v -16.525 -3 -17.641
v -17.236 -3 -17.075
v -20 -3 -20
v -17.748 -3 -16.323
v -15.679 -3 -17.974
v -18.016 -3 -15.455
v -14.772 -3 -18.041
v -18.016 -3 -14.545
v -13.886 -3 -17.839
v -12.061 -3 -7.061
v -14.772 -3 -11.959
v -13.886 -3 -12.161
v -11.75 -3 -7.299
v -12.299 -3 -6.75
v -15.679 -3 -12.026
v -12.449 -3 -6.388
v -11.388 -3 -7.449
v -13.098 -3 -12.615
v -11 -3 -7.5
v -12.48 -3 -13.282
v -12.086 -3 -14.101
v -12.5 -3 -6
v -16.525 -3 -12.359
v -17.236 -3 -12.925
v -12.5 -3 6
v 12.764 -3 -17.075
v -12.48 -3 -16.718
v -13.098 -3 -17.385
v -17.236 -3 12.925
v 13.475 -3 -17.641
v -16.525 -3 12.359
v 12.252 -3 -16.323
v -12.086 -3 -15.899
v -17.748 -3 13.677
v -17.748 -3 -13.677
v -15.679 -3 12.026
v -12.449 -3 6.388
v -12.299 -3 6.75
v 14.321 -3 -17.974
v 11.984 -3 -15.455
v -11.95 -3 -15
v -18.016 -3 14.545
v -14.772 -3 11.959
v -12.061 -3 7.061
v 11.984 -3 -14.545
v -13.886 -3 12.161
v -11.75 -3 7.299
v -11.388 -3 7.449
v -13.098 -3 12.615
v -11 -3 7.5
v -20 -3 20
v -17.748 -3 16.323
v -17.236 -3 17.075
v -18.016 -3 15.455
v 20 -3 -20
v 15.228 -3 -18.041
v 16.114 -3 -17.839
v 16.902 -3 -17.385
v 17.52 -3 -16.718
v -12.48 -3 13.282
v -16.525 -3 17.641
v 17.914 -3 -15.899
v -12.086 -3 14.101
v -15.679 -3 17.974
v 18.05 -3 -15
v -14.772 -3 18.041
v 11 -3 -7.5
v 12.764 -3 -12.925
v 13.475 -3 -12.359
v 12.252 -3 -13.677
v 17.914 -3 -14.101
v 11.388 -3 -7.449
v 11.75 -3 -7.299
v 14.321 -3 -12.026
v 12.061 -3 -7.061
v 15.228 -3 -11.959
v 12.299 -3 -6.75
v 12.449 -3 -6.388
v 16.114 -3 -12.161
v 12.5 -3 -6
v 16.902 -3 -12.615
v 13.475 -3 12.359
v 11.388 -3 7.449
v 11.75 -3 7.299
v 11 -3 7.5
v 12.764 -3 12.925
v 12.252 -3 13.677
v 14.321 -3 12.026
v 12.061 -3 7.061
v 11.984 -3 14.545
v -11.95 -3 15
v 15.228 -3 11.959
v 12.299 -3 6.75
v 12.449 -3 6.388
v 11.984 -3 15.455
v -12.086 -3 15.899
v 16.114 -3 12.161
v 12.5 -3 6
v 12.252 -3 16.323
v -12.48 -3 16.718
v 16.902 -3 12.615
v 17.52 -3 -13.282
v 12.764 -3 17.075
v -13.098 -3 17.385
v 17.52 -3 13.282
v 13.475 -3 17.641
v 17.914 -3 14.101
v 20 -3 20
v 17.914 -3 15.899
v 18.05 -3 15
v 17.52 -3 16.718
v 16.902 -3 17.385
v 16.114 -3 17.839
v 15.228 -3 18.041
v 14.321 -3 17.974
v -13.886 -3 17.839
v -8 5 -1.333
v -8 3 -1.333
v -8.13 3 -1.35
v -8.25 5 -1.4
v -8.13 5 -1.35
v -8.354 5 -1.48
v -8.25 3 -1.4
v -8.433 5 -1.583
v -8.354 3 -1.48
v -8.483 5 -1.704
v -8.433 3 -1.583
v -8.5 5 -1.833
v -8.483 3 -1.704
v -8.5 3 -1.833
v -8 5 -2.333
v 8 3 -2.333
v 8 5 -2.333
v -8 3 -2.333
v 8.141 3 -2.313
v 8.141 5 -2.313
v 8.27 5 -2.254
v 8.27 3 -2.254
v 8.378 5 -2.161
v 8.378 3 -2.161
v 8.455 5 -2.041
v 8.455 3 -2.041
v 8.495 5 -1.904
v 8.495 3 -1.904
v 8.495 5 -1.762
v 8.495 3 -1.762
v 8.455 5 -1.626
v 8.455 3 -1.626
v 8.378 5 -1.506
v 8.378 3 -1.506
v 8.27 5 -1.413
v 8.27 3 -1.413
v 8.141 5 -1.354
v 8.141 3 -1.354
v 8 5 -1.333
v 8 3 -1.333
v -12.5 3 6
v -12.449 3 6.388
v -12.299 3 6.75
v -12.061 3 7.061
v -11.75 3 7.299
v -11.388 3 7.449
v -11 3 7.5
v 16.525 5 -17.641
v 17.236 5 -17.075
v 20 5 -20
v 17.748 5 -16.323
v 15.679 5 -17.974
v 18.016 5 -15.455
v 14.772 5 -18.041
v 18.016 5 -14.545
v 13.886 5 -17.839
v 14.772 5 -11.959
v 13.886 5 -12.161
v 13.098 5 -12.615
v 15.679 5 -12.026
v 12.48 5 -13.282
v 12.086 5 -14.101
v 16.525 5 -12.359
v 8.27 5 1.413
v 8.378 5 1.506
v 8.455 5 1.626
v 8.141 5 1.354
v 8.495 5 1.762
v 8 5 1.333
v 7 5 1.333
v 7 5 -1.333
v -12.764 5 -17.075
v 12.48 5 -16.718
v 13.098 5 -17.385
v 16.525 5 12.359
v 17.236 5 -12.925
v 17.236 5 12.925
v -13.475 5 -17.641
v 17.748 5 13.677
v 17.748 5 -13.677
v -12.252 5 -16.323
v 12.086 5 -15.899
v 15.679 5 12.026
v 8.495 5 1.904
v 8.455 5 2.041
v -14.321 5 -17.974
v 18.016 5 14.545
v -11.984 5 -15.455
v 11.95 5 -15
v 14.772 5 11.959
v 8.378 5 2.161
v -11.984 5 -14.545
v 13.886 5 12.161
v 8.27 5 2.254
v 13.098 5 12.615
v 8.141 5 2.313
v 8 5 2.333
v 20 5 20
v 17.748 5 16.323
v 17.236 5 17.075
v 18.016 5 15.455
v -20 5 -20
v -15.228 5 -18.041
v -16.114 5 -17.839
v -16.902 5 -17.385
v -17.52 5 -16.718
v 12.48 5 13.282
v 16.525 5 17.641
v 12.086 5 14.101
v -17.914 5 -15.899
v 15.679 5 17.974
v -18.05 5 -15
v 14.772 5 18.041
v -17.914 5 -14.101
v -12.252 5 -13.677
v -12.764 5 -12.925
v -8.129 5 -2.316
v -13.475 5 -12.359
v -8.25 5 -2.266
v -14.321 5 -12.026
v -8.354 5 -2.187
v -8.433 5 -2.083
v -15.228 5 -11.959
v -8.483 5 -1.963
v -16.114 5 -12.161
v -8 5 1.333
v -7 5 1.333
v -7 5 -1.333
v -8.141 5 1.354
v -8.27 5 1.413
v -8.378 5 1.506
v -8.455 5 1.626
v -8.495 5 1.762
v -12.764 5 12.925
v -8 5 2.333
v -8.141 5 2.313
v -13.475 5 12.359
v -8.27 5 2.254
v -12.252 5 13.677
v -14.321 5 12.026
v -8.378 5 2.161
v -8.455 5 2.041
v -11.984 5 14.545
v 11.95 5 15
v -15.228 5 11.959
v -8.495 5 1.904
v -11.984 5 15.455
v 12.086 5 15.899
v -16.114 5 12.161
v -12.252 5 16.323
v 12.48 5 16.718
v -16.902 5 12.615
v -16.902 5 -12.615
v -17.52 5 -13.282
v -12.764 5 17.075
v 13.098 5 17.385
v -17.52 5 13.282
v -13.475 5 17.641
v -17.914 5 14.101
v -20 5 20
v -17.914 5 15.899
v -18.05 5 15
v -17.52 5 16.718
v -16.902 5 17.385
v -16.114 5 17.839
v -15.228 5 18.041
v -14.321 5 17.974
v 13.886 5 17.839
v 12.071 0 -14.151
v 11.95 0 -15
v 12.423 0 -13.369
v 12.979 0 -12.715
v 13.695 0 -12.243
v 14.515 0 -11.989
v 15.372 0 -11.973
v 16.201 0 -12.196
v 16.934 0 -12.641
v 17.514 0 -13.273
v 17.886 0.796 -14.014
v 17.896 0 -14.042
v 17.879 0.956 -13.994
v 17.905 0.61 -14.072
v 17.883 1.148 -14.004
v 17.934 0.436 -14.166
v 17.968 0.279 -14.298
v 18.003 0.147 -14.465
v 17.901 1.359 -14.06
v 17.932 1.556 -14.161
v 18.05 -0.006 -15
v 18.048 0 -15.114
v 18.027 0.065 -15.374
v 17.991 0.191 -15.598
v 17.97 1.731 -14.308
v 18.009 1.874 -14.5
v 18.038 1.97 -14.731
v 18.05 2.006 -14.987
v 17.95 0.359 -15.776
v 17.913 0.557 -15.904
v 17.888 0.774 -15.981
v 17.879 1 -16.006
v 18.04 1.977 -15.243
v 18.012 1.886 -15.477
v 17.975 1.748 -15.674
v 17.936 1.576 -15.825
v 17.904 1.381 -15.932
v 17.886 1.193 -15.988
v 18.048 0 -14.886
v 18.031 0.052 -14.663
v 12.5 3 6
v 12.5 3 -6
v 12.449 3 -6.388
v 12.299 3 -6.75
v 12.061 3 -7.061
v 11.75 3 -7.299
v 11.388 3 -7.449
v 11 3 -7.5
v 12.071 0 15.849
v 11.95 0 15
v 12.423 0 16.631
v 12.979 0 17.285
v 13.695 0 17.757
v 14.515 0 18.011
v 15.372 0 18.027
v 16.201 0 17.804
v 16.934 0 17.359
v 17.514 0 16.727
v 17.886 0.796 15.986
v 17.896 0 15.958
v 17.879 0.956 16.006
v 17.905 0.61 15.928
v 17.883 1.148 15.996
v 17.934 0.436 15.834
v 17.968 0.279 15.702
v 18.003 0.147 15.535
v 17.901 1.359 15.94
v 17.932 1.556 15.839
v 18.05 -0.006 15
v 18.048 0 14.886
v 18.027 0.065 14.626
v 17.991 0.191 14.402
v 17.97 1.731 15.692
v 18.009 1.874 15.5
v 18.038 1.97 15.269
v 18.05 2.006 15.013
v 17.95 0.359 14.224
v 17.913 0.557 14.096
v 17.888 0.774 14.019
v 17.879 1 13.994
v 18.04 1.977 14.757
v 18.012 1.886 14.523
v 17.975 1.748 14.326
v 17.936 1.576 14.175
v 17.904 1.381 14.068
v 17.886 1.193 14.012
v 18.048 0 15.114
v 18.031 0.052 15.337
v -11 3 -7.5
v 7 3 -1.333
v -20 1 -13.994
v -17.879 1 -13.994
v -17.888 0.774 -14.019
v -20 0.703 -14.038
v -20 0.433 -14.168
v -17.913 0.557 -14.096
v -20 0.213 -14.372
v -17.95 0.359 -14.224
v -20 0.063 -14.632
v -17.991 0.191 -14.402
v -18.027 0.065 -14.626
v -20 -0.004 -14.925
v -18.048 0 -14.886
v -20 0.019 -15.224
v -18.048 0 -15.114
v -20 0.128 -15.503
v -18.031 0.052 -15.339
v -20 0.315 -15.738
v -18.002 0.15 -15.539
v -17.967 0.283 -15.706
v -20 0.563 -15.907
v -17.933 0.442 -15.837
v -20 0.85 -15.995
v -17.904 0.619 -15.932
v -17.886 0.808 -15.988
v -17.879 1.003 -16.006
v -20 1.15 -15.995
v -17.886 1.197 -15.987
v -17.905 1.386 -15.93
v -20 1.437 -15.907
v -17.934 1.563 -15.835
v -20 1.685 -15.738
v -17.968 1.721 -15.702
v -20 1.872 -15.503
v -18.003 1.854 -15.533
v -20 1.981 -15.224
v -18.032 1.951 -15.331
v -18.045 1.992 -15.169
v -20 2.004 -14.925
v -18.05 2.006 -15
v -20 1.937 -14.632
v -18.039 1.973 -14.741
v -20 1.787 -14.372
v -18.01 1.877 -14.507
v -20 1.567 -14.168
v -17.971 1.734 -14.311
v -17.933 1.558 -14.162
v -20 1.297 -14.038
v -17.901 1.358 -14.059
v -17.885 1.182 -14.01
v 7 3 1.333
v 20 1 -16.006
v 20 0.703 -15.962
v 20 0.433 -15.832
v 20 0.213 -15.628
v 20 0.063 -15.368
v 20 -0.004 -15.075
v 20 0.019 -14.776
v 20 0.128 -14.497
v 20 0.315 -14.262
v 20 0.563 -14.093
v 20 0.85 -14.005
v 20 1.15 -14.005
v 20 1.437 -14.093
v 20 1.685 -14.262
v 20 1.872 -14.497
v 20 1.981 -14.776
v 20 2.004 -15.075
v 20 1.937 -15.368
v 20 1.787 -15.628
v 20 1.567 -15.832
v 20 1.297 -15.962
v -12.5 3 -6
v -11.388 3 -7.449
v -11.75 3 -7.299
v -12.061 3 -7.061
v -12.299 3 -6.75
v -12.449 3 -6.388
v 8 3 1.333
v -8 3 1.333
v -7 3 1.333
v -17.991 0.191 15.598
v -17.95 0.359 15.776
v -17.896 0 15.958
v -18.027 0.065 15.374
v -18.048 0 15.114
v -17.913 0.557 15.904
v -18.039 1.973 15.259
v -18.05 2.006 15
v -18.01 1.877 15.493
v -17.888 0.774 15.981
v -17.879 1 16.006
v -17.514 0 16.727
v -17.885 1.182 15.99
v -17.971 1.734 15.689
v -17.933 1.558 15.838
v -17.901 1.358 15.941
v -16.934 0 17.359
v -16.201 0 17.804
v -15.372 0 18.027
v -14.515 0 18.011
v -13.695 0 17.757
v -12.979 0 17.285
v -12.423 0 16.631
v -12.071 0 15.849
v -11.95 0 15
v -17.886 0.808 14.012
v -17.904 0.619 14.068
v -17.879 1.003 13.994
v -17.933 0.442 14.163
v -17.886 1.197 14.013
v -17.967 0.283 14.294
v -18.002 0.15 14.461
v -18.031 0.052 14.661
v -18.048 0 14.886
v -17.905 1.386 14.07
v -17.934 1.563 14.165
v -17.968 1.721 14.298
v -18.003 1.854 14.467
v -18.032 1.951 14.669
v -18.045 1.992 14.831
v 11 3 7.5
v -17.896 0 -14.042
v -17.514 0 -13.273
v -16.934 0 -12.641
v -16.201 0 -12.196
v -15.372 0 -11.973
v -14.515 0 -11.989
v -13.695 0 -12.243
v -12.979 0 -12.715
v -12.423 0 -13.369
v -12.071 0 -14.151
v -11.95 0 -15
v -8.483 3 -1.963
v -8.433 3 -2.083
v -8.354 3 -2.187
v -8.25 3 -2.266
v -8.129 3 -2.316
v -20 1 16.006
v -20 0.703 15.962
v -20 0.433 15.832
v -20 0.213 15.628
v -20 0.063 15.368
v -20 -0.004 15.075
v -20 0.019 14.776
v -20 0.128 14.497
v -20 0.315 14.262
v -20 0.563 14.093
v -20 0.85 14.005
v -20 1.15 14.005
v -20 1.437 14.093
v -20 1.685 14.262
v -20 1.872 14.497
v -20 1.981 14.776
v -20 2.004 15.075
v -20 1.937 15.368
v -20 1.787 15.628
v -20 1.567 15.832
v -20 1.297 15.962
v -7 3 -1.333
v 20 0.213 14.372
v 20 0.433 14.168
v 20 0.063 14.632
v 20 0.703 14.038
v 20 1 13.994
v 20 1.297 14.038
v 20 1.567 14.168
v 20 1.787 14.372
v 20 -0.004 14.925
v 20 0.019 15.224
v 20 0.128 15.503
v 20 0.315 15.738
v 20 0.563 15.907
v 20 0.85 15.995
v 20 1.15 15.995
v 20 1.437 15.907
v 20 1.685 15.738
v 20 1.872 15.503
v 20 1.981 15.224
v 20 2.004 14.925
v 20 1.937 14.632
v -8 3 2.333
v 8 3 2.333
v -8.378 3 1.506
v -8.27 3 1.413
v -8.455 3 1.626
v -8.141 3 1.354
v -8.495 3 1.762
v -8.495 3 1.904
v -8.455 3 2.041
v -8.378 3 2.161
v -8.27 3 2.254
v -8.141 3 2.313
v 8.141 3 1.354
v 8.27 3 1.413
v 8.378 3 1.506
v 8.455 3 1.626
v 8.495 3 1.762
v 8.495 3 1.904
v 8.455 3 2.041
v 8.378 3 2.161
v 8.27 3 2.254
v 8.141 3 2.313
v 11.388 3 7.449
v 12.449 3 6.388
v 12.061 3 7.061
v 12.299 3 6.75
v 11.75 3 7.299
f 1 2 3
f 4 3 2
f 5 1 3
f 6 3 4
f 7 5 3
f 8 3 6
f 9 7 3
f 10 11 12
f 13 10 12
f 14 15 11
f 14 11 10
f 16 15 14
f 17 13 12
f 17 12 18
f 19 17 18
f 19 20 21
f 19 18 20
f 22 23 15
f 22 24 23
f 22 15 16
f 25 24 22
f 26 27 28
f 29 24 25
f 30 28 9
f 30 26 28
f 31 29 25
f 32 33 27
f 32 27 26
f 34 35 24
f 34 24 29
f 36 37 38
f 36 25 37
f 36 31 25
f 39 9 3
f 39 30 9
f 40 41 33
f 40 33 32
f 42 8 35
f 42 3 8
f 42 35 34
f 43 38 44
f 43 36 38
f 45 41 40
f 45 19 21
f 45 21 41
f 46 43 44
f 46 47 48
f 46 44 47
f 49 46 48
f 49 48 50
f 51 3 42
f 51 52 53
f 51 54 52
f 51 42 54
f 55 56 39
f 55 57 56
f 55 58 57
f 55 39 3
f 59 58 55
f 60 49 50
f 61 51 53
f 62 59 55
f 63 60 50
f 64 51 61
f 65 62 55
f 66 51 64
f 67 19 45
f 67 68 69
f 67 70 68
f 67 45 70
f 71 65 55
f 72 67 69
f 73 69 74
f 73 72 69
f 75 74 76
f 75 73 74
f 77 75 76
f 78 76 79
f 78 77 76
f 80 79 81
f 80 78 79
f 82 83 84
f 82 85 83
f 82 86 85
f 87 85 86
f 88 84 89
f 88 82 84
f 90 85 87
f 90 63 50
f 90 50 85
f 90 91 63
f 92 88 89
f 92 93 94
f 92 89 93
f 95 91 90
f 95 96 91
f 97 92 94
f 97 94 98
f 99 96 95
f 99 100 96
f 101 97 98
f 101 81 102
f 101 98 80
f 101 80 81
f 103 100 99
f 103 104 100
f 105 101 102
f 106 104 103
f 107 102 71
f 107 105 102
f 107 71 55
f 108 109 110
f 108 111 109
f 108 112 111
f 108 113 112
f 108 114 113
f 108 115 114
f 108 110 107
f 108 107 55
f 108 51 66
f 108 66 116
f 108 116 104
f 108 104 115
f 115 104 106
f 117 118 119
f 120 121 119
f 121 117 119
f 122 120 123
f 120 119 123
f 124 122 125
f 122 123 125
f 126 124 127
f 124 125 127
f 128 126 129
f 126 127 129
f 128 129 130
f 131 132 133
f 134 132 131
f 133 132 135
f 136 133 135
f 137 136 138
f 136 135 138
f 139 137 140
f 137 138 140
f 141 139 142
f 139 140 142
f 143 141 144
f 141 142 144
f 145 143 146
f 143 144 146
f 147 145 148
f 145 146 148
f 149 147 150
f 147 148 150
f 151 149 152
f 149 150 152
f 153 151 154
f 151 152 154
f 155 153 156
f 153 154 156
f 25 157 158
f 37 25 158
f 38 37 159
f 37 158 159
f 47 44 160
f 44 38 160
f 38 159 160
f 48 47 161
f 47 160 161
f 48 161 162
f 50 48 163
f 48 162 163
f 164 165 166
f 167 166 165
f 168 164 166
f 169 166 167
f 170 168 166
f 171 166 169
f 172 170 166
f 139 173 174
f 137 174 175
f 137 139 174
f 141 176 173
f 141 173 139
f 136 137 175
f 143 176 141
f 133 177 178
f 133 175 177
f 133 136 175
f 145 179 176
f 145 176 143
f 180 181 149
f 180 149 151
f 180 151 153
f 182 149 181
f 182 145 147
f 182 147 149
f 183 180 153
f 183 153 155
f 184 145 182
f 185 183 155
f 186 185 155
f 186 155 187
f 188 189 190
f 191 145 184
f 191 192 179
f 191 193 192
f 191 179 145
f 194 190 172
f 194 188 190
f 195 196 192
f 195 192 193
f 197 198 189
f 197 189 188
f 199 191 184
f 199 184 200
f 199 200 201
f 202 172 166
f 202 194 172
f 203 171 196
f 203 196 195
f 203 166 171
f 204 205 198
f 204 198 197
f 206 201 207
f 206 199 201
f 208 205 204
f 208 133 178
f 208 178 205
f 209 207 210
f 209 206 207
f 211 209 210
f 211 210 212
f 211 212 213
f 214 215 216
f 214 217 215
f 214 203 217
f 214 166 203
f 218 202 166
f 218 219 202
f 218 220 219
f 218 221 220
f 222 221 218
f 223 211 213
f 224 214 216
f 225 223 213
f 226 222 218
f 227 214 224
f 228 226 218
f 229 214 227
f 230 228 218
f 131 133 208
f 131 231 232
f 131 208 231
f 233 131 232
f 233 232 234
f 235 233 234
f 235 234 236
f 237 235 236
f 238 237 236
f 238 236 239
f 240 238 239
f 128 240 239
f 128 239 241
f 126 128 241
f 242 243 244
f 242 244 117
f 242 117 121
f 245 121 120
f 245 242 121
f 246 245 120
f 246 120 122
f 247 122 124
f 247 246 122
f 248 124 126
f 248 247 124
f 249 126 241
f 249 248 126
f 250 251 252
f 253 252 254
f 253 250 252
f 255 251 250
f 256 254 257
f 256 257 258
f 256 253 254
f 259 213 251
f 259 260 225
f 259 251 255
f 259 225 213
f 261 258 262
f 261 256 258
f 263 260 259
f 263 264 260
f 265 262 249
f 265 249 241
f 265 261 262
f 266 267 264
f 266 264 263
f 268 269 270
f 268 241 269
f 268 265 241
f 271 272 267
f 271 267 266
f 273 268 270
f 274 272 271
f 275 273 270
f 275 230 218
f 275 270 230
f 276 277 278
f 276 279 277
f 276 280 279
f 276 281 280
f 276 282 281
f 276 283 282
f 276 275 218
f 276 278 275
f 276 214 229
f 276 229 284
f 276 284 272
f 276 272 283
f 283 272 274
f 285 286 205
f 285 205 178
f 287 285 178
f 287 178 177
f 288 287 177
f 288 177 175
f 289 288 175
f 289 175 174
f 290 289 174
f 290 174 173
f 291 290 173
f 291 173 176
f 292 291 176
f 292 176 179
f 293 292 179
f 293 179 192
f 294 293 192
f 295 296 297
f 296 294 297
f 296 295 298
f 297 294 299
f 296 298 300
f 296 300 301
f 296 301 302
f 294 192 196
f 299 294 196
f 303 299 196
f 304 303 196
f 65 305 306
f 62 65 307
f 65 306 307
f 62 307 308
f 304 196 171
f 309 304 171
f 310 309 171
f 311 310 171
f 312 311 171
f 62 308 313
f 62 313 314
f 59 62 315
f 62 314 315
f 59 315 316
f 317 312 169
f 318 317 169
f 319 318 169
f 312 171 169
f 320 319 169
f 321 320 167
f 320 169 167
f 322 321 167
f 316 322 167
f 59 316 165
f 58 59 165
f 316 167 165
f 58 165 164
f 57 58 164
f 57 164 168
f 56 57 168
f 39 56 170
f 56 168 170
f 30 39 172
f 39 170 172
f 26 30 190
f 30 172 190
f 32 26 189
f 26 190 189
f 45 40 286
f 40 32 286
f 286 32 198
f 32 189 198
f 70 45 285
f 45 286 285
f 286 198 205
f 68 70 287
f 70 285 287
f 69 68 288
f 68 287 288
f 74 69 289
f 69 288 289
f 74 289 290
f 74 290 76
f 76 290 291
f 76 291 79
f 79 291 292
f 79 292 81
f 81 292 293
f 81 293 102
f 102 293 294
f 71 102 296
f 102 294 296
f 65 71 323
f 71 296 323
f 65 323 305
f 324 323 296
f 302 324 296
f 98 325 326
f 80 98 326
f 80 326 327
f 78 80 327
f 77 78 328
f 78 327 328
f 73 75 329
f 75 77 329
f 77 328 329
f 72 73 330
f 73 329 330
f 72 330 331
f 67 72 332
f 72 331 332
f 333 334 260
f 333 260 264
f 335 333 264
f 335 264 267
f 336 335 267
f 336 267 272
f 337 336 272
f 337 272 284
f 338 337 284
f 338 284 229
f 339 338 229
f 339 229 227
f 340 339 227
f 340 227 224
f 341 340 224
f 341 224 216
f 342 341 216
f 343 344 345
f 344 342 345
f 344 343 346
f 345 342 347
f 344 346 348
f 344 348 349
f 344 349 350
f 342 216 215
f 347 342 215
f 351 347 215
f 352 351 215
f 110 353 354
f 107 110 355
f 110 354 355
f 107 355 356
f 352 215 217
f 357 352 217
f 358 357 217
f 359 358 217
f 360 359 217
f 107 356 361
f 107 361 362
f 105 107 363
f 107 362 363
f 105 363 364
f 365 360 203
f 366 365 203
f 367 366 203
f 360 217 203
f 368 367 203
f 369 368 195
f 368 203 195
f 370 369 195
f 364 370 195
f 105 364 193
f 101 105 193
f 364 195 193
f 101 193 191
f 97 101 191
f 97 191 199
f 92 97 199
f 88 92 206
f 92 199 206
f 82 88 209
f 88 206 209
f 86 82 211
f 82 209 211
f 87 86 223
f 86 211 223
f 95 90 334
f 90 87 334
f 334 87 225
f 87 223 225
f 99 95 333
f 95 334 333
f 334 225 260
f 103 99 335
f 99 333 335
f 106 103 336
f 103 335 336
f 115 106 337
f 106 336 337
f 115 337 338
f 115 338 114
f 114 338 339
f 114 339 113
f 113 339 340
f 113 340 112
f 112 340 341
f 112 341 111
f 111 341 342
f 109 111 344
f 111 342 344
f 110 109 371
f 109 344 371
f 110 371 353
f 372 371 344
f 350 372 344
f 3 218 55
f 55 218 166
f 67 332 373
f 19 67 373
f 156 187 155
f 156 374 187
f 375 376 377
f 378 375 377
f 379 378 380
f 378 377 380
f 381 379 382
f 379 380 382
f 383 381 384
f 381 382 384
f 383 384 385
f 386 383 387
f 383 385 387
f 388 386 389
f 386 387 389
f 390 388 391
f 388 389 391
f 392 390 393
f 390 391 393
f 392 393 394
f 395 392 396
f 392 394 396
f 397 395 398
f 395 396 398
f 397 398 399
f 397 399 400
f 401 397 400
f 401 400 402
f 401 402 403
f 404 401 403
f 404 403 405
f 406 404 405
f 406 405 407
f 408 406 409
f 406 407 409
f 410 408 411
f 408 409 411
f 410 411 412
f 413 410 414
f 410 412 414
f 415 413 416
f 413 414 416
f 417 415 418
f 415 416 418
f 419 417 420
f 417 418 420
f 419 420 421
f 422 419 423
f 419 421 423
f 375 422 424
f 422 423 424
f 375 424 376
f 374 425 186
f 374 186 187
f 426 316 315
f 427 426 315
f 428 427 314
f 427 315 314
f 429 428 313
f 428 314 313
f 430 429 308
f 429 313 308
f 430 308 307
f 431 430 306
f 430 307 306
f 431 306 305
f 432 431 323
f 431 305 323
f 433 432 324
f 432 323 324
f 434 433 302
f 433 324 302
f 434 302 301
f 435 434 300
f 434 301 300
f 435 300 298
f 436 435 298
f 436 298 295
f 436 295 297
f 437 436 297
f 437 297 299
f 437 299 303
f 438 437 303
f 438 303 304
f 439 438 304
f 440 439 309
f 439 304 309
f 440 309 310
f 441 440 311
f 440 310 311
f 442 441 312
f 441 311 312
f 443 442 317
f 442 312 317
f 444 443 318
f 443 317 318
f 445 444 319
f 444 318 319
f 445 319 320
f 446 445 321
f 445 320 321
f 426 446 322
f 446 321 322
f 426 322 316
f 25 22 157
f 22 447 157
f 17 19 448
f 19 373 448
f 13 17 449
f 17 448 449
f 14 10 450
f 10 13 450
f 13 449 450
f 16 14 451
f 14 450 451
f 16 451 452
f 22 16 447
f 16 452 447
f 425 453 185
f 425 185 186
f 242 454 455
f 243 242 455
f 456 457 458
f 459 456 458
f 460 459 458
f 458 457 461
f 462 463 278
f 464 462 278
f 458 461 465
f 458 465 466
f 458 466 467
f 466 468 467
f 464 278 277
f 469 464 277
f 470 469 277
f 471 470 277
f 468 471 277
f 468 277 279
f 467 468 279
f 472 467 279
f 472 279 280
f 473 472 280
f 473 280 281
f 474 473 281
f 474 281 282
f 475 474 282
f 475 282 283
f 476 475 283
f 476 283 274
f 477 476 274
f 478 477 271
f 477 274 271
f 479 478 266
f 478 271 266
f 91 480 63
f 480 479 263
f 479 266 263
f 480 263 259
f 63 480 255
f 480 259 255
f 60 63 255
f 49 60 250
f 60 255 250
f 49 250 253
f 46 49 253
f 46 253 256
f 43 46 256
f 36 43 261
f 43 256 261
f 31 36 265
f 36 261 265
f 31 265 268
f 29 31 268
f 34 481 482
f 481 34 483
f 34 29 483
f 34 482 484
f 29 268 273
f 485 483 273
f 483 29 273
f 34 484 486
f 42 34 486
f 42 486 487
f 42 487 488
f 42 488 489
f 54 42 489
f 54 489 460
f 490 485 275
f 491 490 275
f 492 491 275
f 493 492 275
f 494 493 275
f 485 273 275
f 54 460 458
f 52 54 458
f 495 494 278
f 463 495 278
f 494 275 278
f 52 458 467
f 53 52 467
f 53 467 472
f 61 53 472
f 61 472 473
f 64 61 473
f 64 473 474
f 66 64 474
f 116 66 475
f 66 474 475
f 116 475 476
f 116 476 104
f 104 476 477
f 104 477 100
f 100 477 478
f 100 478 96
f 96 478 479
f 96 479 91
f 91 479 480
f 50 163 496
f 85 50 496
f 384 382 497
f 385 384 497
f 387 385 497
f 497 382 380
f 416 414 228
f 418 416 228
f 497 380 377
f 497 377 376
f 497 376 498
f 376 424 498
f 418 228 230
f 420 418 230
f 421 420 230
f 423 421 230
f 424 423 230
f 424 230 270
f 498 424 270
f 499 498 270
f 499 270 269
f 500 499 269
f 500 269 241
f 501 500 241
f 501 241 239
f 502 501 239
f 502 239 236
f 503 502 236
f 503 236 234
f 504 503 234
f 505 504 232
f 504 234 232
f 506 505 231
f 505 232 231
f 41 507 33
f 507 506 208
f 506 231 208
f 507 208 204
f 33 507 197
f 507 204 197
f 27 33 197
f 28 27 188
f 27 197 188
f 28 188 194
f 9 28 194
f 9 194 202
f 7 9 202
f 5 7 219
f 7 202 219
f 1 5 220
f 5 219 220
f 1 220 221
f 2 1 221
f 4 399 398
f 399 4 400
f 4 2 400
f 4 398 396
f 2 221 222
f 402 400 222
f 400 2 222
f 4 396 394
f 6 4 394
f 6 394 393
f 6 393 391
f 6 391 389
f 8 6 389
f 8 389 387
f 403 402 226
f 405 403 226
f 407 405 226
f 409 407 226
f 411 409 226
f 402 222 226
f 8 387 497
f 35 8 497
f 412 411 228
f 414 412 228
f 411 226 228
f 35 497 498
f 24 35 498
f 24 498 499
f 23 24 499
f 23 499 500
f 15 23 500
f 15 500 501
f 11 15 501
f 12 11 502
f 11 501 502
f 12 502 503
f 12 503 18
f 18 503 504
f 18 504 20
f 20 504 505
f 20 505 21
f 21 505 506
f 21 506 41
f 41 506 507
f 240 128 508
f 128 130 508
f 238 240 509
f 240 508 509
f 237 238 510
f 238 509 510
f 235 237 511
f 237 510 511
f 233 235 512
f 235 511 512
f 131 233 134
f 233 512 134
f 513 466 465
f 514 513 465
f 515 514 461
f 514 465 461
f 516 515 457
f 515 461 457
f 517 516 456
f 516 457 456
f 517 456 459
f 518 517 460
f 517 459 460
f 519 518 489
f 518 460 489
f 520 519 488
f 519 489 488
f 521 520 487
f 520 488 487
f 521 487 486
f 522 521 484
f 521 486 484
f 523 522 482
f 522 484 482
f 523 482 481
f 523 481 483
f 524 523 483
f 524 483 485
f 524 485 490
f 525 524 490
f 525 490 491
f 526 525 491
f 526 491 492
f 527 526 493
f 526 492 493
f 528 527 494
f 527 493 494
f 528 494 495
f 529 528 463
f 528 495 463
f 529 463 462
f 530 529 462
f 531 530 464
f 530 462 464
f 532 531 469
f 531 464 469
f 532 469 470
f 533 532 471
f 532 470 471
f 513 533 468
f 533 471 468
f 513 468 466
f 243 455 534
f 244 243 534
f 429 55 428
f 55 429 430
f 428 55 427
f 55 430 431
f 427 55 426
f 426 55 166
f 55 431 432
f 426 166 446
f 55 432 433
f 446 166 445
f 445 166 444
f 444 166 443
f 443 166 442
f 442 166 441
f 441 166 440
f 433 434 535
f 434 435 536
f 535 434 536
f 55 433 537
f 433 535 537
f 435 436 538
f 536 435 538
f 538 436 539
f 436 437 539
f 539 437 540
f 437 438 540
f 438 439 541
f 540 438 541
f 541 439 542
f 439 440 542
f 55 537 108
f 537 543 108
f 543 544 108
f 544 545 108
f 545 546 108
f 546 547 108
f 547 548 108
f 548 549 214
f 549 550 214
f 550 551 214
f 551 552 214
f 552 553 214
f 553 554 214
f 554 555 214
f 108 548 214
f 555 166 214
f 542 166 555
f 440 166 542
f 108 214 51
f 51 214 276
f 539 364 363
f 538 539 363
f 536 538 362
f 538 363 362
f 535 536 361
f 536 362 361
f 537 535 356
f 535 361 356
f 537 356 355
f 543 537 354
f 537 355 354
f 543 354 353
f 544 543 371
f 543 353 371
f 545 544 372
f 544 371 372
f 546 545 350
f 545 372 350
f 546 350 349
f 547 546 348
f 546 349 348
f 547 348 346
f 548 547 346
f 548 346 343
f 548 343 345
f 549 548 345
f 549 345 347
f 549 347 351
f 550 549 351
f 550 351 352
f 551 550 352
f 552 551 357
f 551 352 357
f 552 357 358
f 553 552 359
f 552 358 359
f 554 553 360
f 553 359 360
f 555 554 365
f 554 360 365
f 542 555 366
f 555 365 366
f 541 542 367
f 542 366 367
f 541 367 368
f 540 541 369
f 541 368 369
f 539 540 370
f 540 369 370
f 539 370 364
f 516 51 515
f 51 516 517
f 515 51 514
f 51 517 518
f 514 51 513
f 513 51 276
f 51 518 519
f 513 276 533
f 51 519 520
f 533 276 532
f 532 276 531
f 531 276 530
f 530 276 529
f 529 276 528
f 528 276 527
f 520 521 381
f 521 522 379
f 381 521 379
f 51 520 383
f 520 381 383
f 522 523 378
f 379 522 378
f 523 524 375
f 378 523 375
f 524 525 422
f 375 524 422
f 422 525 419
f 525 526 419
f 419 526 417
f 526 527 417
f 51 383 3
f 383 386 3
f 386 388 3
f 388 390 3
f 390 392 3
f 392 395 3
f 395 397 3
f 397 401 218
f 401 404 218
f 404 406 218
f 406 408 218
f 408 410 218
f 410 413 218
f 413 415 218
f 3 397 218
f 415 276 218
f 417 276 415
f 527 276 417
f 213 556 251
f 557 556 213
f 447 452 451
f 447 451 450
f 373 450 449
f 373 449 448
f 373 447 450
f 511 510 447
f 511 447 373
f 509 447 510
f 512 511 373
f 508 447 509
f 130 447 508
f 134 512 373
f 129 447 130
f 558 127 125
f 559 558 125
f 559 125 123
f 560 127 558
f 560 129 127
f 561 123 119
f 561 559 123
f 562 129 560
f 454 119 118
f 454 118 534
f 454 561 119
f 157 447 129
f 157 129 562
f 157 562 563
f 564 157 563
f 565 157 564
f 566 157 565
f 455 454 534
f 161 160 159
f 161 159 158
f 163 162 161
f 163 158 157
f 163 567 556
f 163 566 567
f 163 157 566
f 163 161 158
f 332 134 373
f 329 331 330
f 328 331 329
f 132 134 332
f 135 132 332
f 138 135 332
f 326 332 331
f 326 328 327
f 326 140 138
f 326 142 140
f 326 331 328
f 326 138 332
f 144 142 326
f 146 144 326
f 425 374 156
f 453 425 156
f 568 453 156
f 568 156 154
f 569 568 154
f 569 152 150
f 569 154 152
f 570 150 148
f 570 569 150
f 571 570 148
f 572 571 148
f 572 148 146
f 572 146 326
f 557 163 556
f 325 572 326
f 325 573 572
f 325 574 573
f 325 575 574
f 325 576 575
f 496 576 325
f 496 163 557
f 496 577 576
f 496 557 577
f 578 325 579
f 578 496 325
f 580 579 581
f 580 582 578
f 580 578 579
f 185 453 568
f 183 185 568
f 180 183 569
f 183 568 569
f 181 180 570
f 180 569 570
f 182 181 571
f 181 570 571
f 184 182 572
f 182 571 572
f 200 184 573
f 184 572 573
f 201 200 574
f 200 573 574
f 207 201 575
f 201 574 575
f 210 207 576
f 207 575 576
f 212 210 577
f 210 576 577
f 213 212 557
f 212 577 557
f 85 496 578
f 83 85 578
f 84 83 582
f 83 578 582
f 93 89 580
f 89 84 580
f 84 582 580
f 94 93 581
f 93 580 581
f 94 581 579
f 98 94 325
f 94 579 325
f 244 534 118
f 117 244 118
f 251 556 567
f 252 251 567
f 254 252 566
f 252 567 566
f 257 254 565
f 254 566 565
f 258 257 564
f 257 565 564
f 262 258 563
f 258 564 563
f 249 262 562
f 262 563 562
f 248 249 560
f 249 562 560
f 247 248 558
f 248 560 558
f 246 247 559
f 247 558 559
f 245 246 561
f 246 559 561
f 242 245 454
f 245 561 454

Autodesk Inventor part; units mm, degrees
ref_plane "YZ Plane" through (0, 0, 0) normal (1, 0, 0) x (0, 1, 0)
ref_plane "XZ Plane" through (0, 0, 0) normal (0, 1, 0) x (-1, 0, 0)
ref_plane "XY Plane" through (0, 0, 0) normal (0, 0, 1) x (1, 0, 0)
sketch "Sketch1" plane through (0, 0, 0) normal (0, 1, 0) x (-1, 0, 0)
  line L0 (20, 20) -> (20, -20)
  line L1 (20, -20) -> (-20, -20)
  line L2 (-20, -20) -> (-20, 20)
  line L3 (-20, 20) -> (20, 20)
  line L4 (-15, 15) -> (-15, -15) construction
  line L5 (-15, -15) -> (15, -15) construction
  line L6 (15, -15) -> (15, 15) construction
  line L7 (15, 15) -> (-15, 15) construction
  circle A0 centre (15, 15) radius 3.05
  circle A1 centre (15, -15) radius 3.05
  circle A2 centre (-15, -15) radius 3.05
  circle A3 centre (-15, 15) radius 3.05
  line L8 (0, 0) -> (-18.5703, 0) construction
  line L9 (0, 0) -> (0, 25.6262) construction
  line L10 (0, 0) -> (-18.05, 0) construction
  line L11 (8, 2.3333) -> (-8, 2.3333)
  line L12 (-8.5, 1.8333) -> (-8.5, 1.8333)
  line L13 (8.5, 1.8333) -> (8.5, 1.8333)
  line L14 (8.5, 2.3333) -> (-8.5, 3.0056) construction
  line L15 (-8.5, 2.3333) -> (8.5, 3.0548) construction
  arc A4 (8.5, 1.8333) -> (8, 2.3333) centre (8, 1.8333) ccw
  arc A5 (8, 1.3333) -> (8.5, 1.8333) centre (8, 1.8333) ccw
  arc A6 (-8.5, 1.8333) -> (-8, 1.3333) centre (-8, 1.8333) ccw
  arc A7 (-8, 2.3333) -> (-8.5, 1.8333) centre (-8, 1.8333) ccw
  line L16 (-8.5, -1.8333) -> (-8.5, -1.8333)
  line L17 (-8, -2.3333) -> (8, -2.3333)
  line L18 (8.5, -1.8333) -> (8.5, -1.8333)
  line L19 (8.5, -0.691) -> (-8.5, -2.3333) construction
  line L20 (-8.5, -0.6827) -> (8.5, -2.3333) construction
  arc A8 (8.5, -1.8333) -> (8.0002, -1.3333) centre (8, -1.8333) ccw
  arc A9 (8, -2.3333) -> (8.5, -1.8333) centre (8, -1.8333) ccw
  arc A10 (-8.5, -1.8333) -> (-8, -2.3333) centre (-8, -1.8333) ccw
  arc A11 (-8, -1.3333) -> (-8.5, -1.8333) centre (-8, -1.8333) ccw
  line L21 (8, 1.3333) -> (7, 1.3333)
  line L22 (7, 1.3333) -> (7, -1.3333)
  line L23 (7, -1.3333) -> (8.0002, -1.3333)
  line L24 (-8, 1.3333) -> (-7, 1.3333)
  line L25 (-7, 1.3333) -> (-7, -1.3333)
  line L26 (-7, -1.3333) -> (-8, -1.3333)
  point P0 (0, -12.01)
  point P1 (-0.3001, 2.6813)
  point P2 (0, 2.694)
  point P3 (0.0215, -1.5101)
  point P4 (0, -1.508)
  point P5 (0, -1.5122)
  dimension "d0" = 40
  dimension "d1" = 40
  dimension "d2" = 30
  dimension "d53" = 20
  dimension "d114" = 17
  dimension "d117" = 0.5
  dimension "d140" = 17
  dimension "d142" = 0.5
  dimension "d146" = 14
  dimension "d147" = 7
  dimension "d150" = 1.3333
  dimension "d151" = 1.3333
  dimension "d152" = 2.3333
  dimension "d153" = 2.3333
extrude "Extrusion15" add sketch "Sketch1" along normal blind 5
sketch "Sketch11" plane through (0, 0, 0) normal (0, -1, 0) x (1, 0, 0)
  line L0 (-11, -7.5) -> (11, -7.5)
  line L1 (12.5, -6) -> (12.5, 6)
  line L2 (11, 7.5) -> (-11, 7.5)
  line L3 (-12.5, 6) -> (-12.5, -6)
  line L4 (-12.5, -7.5) -> (12.5, 7.5) construction
  line L5 (12.5, -7.5) -> (-12.5, 7.5) construction
  arc A0 (-11, 7.5) -> (-12.5, 6) centre (-11, 6) ccw
  arc A1 (-12.5, -6) -> (-11, -7.5) centre (-11, -6) ccw
  arc A2 (11, -7.5) -> (12.5, -6) centre (11, -6) ccw
  arc A3 (12.5, 6) -> (11, 7.5) centre (11, 6) ccw
  point P0 (0, 0)
  dimension "d154" = 15
  dimension "d155" = 25
  dimension "d156" = 1.5
extrude "Extrusion16" cut sketch "Sketch11" against normal blind 3
sketch "Sketch14" plane through (0, 0, 0) normal (0, -1, 0) x (1, 0, 0)
  arc A0 (-12.5, -6) -> (-11, -7.5) centre (-11, -6) ccw projected
  line L0 (-12.5, -6) -> (-12.5, 6) projected
  arc A1 (-11, 7.5) -> (-12.5, 6) centre (-11, 6) ccw projected
  line L1 (-11, 7.5) -> (11, 7.5) projected
  arc A2 (12.5, 6) -> (11, 7.5) centre (11, 6) ccw projected
  line L2 (12.5, 6) -> (12.5, -6) projected
  arc A3 (11, -7.5) -> (12.5, -6) centre (11, -6) ccw projected
  line L3 (11, -7.5) -> (-11, -7.5) projected
  circle A4 centre (15, 15) radius 3.05 projected
  circle A5 centre (15, -15) radius 3.05 projected
  circle A6 centre (-15, -15) radius 3.05 projected
  circle A7 centre (-15, 15) radius 3.05 projected
  line L4 (-20, 20) -> (-20, -20) projected
  line L5 (-20, -20) -> (20, -20) projected
  line L6 (20, -20) -> (20, 20) projected
  line L7 (20, 20) -> (-20, 20) projected
  point P0 (0, 0)
extrude "Extrusion17" add sketch "Sketch14" along normal blind 3
sketch "Sketch12" plane through (20, 0, 20) normal (1, 0, 0) x (0, 0, -1)
  line L0 (40, 5) -> (40, -3) projected
  line L1 (0, 5) -> (40, 5) projected
  line L2 (0, 5) -> (0, -3) projected
  line L3 (40, -3) -> (0, -3) projected
  point P0 (20, 0)
  point P1 (5, 1)
  point P2 (35, 1)
  dimension "d163" = 5
  dimension "d164" = 5
  dimension "d165" = 4
  dimension "d166" = 4
hole "Hole1" at (20, 1, 15) at (20, 1, -15) direction (-1, 0, 0) diameter 2.013 depth 5 tip angle 118 thread size "M2.5x0.45" class "6H" standard "ISO Metric profile"
sketch "Sketch13" plane through (-20, 0, -20) normal (-1, 0, 0) x (0, 0, 1)
  line L0 (40, -3) -> (40, 5) projected
  line L1 (0, 5) -> (40, 5) projected
  line L2 (0, 5) -> (0, -3) projected
  circle A0 centre (35, 1) radius 1.0065 projected
  circle A1 centre (5, 1) radius 1.0065 projected
  line L3 (40, -3) -> (0, -3) projected
  point P0 (20, 0)
  point P1 (33.9935, 1)
  point P2 (3.9935, 1)
hole "Hole2" at (-20, 1, 15) at (-20, 1, -15) direction (1, 0, 0) diameter 2.013 depth 5 tip angle 118 thread size "M2.5x0.45" class "6H" standard "ISO Metric profile"
equation "\"d1\" = d0"
properties part number "HolderStart"
